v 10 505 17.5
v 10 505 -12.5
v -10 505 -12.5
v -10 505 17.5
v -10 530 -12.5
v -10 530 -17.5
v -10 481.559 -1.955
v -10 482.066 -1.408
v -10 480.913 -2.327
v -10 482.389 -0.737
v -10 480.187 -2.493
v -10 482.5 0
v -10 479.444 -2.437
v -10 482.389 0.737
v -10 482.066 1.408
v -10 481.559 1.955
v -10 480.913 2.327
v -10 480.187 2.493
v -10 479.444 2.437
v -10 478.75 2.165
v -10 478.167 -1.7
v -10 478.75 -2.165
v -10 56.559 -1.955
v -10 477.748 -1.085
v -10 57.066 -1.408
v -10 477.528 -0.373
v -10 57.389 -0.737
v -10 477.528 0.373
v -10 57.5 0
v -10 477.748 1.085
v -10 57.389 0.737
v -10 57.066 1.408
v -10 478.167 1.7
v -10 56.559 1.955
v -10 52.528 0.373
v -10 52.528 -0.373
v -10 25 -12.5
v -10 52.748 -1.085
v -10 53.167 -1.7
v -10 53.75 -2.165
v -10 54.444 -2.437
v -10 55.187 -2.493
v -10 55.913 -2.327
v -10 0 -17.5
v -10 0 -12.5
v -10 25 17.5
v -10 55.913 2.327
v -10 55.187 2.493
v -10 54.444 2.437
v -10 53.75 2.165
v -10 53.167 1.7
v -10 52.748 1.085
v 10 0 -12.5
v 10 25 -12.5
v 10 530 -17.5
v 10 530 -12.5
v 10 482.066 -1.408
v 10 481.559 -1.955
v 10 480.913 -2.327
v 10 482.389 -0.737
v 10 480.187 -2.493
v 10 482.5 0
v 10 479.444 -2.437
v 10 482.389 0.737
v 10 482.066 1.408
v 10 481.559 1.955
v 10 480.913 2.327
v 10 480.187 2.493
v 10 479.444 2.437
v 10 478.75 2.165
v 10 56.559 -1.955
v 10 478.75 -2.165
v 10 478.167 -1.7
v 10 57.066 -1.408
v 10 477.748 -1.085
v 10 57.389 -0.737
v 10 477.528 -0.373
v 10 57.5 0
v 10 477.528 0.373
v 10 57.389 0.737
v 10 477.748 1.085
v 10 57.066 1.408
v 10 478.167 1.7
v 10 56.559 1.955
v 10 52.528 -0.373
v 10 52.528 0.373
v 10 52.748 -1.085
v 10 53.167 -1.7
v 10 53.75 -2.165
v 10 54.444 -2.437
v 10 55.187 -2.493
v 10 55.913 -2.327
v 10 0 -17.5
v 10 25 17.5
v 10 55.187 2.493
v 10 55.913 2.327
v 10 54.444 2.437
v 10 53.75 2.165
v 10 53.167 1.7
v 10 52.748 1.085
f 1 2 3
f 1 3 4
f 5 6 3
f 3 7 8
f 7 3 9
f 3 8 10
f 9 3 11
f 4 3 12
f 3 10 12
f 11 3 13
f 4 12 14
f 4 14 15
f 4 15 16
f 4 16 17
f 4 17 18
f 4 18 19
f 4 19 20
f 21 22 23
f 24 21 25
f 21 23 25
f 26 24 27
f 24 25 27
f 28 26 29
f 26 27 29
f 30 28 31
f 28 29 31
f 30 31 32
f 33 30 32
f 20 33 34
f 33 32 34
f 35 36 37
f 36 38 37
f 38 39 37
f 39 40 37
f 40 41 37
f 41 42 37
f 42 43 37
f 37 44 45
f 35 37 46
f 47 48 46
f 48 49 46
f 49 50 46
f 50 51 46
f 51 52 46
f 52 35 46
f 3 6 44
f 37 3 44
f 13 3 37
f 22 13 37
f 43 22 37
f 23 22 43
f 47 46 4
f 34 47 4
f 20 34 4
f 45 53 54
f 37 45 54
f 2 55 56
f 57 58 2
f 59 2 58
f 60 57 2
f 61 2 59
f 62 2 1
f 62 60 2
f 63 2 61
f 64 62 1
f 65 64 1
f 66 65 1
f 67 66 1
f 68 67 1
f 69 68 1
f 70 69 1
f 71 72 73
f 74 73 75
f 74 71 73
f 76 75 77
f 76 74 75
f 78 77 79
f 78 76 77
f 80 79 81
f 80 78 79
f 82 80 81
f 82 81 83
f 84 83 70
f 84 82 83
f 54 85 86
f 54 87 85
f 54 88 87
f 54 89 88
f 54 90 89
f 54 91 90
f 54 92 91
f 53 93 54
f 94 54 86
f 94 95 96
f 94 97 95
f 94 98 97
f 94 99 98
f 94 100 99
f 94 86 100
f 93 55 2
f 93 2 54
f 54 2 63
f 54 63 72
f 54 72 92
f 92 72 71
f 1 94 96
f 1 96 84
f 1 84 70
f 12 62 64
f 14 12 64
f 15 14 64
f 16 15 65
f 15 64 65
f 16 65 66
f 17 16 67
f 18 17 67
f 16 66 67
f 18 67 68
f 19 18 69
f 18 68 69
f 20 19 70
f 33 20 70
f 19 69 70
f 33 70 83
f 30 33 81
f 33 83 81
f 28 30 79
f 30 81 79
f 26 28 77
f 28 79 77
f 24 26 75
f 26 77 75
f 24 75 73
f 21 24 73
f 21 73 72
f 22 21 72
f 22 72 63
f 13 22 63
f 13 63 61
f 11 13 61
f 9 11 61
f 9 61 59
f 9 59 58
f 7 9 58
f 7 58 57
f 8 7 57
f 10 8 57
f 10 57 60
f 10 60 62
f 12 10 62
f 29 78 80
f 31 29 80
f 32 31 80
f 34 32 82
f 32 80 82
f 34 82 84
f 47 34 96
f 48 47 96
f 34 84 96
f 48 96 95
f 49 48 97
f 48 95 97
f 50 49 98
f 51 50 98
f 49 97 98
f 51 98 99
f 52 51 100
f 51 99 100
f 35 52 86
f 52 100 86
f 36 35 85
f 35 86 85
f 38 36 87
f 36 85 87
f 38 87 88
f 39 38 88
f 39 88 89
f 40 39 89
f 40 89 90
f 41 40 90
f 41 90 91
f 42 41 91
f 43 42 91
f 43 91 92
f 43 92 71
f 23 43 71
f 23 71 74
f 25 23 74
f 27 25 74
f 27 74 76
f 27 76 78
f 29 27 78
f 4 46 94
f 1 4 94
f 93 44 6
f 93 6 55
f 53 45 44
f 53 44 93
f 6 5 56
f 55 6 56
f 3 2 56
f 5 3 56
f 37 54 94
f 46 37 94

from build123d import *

# Parameters (mm, degrees)
F0_W     = 20
F0_H     = 35
F1_DEPTH = 530
F2_W     = 25
F2_H     = 30
F3_DEPTH = 20
F4_R     = 2.5
F5_DEPTH = 25


with BuildPart() as f1:
    # F0 (on Front) → F1 (new body)
    with BuildSketch(Plane.XZ):
        Rectangle(F0_W, F0_H)
    extrude(amount=-F1_DEPTH)

    # F2 (on face) → F3 (cut)
    with BuildSketch(Plane.YZ.offset(10)):
        with Locations((12.5, 2.5)):
            Rectangle(F2_W, F2_H)
        with Locations((517.5, 2.5)):
            Rectangle(F2_W, F2_H)
    extrude(amount=-F3_DEPTH, mode=Mode.SUBTRACT)

    # F4 (on face) → F5 (cut)
    with BuildSketch(Plane.YZ.offset(10)):
        with Locations((55, 0)):
            Circle(F4_R)
        with Locations((480, 0)):
            Circle(F4_R)
    extrude(amount=-F5_DEPTH, mode=Mode.SUBTRACT)


solid = f1.part
